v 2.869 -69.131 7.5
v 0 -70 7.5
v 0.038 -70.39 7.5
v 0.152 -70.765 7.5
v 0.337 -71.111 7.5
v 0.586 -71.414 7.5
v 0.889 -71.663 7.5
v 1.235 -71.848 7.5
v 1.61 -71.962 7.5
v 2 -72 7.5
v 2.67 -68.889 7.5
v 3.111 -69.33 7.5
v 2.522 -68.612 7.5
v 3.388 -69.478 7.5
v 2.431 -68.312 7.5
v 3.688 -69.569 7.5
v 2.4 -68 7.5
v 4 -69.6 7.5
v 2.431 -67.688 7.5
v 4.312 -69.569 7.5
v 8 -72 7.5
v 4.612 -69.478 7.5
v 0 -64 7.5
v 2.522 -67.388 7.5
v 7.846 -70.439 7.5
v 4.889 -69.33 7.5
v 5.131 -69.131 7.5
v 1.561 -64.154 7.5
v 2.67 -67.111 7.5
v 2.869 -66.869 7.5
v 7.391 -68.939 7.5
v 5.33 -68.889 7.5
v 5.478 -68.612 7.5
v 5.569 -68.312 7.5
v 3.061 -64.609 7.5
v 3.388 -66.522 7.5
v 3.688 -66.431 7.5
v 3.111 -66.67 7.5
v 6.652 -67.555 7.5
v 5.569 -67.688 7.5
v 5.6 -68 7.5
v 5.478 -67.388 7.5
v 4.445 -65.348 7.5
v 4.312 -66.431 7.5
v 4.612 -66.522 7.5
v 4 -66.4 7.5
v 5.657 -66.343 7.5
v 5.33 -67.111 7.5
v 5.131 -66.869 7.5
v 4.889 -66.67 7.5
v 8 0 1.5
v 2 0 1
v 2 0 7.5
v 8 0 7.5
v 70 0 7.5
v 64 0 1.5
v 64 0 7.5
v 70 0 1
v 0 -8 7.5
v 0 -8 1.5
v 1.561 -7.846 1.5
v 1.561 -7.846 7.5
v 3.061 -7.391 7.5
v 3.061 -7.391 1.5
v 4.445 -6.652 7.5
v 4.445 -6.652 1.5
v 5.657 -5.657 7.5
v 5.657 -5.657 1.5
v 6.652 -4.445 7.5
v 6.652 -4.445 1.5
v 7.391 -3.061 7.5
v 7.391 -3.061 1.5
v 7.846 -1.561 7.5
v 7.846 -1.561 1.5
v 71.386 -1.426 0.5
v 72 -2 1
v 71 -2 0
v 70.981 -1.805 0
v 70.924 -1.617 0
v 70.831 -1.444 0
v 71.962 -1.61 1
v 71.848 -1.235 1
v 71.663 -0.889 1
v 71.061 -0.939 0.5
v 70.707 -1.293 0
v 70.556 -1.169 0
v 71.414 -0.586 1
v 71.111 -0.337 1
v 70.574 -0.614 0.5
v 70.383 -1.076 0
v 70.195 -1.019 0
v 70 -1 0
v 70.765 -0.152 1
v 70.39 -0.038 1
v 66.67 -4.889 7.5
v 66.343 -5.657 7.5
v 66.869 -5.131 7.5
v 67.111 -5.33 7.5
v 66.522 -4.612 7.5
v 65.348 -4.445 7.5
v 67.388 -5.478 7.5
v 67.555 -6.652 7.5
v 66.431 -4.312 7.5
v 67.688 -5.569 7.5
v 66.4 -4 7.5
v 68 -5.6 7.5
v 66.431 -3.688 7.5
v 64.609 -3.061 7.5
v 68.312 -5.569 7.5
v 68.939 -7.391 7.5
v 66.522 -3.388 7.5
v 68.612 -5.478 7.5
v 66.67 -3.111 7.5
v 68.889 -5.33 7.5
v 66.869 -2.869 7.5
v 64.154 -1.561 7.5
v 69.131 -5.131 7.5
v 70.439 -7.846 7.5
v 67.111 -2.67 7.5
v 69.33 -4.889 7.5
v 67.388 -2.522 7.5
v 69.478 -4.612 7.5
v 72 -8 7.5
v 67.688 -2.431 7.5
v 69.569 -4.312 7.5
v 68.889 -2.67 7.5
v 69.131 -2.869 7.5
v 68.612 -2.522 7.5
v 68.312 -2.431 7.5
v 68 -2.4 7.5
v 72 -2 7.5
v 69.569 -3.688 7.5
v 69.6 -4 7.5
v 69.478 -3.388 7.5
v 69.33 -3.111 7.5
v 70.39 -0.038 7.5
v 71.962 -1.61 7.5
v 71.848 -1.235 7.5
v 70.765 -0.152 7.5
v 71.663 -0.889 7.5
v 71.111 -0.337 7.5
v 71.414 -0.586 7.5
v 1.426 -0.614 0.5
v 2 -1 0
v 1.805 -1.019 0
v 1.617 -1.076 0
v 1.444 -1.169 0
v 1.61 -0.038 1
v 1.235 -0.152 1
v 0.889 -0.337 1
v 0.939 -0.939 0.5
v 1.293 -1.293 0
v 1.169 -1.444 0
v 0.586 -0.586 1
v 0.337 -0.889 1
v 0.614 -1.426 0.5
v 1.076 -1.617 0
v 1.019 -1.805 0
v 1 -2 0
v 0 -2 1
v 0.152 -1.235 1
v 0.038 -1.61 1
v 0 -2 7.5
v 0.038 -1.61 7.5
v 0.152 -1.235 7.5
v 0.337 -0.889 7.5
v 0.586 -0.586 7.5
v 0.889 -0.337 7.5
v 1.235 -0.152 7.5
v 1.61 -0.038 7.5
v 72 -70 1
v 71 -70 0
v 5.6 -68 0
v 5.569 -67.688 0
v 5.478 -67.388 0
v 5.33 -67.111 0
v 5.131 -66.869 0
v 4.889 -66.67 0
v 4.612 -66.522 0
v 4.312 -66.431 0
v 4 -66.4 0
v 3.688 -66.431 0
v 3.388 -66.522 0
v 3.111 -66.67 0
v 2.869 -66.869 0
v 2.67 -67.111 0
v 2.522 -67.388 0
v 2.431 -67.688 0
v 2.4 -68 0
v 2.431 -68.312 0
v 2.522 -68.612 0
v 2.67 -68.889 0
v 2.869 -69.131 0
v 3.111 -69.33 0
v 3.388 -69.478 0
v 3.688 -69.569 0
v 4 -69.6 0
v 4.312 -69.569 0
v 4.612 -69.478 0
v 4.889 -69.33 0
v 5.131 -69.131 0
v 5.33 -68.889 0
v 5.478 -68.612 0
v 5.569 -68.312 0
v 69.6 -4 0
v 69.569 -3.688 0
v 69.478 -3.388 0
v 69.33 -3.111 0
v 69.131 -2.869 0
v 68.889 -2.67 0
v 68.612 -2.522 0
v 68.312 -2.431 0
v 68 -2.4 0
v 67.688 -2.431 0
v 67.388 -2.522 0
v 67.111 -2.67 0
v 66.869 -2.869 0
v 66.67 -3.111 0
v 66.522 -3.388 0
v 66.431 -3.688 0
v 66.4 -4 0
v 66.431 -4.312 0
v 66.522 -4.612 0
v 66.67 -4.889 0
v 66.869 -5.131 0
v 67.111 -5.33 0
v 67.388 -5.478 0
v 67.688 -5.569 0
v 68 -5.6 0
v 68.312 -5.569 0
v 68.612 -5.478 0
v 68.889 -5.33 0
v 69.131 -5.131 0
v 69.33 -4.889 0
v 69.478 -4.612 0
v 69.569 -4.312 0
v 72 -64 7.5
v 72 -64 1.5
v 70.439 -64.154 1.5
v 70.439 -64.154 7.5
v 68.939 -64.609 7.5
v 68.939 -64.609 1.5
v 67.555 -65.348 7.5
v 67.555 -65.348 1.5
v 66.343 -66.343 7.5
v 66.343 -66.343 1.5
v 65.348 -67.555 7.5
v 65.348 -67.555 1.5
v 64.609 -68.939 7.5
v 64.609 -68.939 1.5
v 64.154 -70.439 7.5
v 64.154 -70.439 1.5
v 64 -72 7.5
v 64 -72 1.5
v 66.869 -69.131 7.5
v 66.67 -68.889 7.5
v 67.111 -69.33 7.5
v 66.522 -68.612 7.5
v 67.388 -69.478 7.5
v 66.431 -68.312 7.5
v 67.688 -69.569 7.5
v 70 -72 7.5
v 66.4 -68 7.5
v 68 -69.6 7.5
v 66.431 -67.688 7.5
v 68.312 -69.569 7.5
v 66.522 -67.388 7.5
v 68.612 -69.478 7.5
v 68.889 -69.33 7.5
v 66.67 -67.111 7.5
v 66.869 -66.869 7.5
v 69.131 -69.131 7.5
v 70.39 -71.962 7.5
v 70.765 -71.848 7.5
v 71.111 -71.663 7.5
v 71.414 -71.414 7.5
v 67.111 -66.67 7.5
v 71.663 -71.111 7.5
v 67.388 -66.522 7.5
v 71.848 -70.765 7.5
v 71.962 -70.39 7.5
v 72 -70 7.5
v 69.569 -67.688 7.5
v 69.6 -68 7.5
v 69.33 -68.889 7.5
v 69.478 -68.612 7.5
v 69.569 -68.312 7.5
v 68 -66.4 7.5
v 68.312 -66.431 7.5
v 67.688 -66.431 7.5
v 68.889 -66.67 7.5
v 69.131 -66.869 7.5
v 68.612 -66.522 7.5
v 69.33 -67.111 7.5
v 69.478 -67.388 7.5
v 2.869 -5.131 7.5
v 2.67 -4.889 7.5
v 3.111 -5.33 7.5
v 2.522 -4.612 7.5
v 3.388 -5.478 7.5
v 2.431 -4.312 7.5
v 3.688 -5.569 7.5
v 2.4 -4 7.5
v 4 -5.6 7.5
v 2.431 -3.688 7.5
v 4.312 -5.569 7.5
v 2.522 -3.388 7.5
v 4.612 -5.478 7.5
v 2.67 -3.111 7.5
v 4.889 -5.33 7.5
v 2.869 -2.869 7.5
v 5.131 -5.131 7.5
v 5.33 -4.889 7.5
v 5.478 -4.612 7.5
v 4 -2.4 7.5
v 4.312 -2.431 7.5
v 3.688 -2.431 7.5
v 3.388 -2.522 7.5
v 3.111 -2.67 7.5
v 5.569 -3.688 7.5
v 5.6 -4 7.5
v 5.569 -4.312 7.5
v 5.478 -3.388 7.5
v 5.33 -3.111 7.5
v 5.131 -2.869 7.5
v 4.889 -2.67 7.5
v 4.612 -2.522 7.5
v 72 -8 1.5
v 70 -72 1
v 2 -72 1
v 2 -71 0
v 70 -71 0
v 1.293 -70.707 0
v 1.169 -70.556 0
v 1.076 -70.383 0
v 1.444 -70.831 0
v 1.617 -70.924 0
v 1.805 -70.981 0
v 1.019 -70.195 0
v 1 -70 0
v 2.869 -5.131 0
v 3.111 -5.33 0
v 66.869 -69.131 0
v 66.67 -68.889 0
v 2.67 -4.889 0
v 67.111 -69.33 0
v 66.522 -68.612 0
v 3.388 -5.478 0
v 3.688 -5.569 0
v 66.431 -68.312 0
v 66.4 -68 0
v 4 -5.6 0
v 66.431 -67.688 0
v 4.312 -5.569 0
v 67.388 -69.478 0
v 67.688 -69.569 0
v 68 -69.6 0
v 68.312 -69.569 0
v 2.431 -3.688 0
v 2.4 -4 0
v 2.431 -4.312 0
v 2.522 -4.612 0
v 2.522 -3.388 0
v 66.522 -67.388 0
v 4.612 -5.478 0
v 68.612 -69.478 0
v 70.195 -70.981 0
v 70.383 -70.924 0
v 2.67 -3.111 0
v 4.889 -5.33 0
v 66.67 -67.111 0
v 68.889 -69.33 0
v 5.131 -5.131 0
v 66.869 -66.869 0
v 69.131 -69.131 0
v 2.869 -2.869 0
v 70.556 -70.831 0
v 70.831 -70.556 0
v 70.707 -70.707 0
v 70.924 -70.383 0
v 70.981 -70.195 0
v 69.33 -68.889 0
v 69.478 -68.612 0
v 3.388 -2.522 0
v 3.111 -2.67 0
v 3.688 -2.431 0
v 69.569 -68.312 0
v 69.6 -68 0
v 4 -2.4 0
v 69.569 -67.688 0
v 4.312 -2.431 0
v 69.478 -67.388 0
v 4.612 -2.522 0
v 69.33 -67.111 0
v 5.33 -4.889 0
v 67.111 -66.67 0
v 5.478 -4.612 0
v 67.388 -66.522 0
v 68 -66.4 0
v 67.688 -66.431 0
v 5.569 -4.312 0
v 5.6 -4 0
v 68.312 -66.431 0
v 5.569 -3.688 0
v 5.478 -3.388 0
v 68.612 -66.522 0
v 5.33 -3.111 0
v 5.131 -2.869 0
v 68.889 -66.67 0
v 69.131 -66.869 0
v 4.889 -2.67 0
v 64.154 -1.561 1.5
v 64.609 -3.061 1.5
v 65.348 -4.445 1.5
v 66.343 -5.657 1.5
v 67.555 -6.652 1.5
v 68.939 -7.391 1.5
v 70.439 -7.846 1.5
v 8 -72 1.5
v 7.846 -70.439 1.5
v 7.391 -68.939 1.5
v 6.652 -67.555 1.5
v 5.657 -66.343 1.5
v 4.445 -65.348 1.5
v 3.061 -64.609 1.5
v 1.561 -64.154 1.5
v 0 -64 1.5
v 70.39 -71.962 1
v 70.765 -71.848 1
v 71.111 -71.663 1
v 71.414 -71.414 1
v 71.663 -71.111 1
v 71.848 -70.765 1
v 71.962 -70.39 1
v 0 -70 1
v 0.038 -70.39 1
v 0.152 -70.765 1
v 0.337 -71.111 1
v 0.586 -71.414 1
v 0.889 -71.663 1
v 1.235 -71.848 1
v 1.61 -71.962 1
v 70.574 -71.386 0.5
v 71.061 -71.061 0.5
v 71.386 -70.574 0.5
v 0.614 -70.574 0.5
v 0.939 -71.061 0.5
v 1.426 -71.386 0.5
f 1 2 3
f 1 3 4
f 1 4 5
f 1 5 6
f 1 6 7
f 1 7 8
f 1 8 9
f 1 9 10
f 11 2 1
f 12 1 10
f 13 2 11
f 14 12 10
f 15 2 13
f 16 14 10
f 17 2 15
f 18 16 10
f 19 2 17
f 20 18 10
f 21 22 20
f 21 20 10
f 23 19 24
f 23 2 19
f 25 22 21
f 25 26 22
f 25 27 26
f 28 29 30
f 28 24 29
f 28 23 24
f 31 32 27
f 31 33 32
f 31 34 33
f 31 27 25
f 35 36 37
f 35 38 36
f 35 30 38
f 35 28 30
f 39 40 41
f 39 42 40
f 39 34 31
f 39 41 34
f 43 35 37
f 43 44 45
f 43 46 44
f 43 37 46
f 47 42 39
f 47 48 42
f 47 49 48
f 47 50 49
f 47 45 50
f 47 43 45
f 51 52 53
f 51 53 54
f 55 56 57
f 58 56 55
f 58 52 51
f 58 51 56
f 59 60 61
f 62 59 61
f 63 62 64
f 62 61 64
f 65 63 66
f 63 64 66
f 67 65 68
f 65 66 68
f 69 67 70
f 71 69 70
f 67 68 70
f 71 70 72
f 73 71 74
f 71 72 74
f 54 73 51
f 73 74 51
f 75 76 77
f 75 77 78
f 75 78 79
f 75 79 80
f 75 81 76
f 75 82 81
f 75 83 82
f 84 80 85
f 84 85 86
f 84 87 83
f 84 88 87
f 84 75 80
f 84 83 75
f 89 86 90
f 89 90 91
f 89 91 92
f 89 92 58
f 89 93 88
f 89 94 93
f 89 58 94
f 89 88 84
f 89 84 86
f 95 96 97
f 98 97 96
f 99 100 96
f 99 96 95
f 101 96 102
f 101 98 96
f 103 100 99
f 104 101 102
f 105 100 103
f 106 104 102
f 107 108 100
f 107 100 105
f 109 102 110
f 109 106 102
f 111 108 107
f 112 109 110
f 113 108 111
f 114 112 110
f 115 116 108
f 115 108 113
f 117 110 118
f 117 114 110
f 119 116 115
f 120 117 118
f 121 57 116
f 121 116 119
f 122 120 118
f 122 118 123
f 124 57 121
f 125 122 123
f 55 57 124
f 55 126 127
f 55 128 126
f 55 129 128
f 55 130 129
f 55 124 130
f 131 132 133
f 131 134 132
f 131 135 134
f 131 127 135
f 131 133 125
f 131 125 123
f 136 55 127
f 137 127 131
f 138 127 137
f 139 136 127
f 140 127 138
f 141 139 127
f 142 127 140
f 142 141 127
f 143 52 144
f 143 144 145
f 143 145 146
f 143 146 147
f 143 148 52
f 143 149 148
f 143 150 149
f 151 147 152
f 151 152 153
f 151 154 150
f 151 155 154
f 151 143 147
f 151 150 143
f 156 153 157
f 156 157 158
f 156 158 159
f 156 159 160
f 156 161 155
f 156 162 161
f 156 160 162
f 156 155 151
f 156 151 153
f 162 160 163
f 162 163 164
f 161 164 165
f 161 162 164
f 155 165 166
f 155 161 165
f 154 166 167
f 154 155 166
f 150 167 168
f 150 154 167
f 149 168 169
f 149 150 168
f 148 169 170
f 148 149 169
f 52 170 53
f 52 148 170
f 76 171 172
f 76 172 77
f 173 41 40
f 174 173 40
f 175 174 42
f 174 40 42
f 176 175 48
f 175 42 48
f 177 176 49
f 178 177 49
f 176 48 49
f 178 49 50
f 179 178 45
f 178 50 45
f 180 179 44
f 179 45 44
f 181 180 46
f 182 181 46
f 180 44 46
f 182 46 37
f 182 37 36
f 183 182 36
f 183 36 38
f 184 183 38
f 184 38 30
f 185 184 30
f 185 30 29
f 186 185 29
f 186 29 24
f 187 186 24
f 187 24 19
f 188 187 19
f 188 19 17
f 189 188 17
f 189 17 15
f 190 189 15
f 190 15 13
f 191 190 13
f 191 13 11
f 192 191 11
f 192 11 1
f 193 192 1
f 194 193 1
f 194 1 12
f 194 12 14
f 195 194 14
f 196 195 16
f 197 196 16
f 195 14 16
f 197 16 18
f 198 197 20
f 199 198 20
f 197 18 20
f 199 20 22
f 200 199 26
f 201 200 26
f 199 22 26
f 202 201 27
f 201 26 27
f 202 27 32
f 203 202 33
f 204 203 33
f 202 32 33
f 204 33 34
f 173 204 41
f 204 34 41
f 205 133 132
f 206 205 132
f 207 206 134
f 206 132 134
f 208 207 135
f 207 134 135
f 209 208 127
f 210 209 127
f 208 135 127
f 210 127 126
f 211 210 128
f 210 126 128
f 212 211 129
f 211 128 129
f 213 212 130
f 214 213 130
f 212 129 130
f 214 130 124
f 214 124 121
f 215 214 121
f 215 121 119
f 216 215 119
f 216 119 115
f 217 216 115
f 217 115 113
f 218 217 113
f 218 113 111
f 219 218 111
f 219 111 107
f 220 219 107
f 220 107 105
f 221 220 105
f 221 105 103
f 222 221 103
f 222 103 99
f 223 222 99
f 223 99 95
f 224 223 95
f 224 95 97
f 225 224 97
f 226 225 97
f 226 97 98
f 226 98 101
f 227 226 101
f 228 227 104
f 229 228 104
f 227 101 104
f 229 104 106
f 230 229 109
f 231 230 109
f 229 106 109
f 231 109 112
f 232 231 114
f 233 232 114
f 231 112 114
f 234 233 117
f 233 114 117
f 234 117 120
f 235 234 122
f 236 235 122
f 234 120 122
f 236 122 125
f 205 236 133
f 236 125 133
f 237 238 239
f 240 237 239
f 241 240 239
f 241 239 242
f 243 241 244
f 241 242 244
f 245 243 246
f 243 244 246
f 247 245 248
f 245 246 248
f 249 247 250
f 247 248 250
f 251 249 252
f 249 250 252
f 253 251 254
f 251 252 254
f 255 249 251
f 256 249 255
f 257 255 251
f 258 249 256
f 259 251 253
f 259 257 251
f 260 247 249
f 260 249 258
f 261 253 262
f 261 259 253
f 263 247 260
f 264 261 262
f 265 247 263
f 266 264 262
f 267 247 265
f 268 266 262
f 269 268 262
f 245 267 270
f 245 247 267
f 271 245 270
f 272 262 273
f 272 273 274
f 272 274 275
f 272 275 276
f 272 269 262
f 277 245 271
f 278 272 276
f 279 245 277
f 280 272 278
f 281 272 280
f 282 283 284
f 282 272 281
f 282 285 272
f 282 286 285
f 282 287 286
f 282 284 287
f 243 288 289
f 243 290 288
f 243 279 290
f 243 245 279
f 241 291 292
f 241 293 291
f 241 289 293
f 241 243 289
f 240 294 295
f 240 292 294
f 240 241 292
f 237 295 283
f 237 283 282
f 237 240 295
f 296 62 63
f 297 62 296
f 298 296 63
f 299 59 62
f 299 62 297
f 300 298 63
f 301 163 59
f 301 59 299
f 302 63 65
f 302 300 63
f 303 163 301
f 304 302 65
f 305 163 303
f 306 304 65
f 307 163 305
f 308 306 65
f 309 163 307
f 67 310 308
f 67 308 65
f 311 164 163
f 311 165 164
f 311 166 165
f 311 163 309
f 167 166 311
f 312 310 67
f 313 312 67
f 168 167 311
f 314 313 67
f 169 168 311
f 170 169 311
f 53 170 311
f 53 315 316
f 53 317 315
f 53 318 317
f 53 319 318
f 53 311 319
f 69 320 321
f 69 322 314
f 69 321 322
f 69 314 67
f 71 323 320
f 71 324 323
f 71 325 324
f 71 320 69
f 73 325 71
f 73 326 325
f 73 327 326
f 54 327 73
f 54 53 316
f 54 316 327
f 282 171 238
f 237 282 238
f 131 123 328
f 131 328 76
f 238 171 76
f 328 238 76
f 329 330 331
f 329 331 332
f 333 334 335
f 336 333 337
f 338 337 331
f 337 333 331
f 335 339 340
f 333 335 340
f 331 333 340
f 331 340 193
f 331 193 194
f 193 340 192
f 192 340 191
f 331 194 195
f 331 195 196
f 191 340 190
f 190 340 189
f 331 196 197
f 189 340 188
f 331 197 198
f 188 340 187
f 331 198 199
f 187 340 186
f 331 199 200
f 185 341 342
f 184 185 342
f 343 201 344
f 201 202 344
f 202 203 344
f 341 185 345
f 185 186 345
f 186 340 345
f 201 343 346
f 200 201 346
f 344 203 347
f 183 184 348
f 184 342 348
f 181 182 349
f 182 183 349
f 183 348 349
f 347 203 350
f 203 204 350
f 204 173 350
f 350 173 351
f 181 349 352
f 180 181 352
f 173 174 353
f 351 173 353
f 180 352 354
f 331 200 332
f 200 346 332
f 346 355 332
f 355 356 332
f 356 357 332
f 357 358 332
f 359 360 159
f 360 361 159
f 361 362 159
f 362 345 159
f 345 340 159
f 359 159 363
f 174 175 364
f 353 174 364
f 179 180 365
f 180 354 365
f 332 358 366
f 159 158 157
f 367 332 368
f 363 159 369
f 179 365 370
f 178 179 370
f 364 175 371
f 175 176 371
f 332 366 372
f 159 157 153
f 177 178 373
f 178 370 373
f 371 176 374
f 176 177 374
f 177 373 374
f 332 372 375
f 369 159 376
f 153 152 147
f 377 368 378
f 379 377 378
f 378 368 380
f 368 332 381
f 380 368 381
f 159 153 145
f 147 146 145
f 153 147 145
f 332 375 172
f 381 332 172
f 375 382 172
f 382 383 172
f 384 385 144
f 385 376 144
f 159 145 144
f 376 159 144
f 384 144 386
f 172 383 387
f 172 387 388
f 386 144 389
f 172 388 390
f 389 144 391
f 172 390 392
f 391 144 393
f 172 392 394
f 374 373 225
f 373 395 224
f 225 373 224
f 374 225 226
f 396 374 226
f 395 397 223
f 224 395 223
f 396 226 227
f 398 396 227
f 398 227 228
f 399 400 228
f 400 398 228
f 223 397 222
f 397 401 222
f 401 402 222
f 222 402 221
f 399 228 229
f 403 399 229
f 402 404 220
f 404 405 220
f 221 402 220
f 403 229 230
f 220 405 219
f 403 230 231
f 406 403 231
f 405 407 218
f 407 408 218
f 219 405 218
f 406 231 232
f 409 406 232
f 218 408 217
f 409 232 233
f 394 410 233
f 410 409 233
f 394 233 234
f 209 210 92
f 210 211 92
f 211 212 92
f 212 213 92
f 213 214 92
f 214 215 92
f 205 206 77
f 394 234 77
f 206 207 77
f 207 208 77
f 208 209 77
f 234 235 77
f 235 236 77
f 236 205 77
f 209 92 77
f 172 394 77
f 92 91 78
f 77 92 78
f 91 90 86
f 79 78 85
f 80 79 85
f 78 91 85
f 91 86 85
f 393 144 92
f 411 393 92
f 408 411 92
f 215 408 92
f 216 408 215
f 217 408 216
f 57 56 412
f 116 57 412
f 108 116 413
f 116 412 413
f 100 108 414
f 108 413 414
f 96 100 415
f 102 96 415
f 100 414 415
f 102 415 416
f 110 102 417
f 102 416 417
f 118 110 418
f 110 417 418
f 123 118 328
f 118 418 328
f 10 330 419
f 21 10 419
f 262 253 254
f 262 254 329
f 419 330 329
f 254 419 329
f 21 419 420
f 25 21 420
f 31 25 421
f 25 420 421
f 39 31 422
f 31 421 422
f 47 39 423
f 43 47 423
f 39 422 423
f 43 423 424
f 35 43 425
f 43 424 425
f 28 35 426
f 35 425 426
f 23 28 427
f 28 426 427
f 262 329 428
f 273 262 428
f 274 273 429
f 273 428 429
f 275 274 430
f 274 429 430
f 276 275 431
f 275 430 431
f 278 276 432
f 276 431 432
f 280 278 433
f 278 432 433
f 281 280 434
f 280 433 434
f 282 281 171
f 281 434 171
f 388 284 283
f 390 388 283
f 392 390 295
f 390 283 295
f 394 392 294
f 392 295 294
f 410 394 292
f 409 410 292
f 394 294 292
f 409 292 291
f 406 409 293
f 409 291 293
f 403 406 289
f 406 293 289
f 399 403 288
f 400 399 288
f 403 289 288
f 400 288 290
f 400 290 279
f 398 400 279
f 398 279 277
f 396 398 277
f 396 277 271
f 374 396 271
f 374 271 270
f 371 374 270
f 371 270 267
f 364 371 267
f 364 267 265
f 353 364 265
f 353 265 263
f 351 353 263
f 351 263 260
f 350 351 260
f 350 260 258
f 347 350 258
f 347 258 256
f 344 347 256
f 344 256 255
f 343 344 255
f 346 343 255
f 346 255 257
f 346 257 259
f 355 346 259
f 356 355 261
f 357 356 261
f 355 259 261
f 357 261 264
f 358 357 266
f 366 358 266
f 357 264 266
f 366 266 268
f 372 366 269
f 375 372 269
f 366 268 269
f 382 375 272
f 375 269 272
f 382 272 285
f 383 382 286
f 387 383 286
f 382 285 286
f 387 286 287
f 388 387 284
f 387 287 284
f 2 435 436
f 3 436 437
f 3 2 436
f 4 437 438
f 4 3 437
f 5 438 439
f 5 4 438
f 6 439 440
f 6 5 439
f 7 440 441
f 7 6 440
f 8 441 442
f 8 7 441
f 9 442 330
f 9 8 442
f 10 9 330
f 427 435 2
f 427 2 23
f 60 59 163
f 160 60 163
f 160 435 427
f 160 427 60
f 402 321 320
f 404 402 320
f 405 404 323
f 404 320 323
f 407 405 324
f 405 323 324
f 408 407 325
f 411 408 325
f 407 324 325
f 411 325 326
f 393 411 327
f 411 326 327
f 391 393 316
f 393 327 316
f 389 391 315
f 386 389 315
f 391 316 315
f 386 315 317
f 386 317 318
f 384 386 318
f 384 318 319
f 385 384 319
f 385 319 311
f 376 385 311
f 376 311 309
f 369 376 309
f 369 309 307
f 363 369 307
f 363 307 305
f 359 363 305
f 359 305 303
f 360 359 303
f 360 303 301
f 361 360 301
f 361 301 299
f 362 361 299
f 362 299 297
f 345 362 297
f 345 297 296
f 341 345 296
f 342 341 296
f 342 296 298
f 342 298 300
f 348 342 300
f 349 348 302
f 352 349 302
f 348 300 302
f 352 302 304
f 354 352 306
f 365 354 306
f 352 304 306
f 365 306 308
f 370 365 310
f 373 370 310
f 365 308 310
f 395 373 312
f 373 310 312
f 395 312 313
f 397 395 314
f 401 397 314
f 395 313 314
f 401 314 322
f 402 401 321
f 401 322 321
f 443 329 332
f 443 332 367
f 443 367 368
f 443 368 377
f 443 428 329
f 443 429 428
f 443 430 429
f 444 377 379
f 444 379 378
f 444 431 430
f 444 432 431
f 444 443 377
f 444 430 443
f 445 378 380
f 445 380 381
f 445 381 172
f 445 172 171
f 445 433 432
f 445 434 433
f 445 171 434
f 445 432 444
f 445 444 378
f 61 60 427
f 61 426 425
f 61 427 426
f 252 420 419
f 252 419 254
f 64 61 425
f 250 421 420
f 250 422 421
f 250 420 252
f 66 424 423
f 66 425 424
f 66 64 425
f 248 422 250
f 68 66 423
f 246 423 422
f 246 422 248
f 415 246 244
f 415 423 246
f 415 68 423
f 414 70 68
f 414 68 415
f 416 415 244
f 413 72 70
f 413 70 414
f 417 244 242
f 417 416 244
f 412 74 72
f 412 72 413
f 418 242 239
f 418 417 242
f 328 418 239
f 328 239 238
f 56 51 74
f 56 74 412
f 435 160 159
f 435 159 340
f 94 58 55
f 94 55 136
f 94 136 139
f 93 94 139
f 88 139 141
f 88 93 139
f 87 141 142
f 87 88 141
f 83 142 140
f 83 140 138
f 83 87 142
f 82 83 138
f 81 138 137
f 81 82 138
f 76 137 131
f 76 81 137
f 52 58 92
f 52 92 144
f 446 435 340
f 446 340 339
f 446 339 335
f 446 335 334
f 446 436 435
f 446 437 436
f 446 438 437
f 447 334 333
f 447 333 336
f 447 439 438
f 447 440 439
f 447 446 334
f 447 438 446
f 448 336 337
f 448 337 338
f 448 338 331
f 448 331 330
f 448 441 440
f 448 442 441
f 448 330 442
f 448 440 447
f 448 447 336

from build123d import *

# Parameters (mm, degrees)
SKETCH_W     = 72
SKETCH_H     = 72
PAD_DEPTH    = 1.5
PAD001_DEPTH = 6
SKETCH002_R  = 1.6
POCKET_DEPTH = 7.501
FILLET_R     = 2
CHAMFER_SIZE = 1


with BuildPart() as part:
    # Sketch → Pad (new body)
    with BuildSketch(Plane.XY):
        with Locations((36, -36)):
            Rectangle(SKETCH_W, SKETCH_H)
    extrude(amount=PAD_DEPTH)

    # Sketch001 (on Face6 of Pad) → Pad001 (join)
    with BuildSketch(Plane.XY.offset(1.5)):
        with BuildLine():
            ThreePointArc((0, -8), (5.656854, -5.656854), (8, 0))
            Line((0, 0), (8, 0))
            Line((0, -8), (0, 0))
        make_face()
        with BuildLine():
            ThreePointArc((8, -72), (5.656854, -66.343146), (0, -64))
            Line((0, -72), (0, -64))
            Line((8, -72), (0, -72))
        make_face()
        with BuildLine():
            ThreePointArc((72, -64), (66.343146, -66.343146), (64, -72))
            Line((64, -72), (72, -72))
            Line((72, -72), (72, -64))
        make_face()
        with BuildLine():
            ThreePointArc((64, 0), (66.343146, -5.656854), (72, -8))
            Line((72, -8), (72, 0))
            Line((72, 0), (64, 0))
        make_face()
    extrude(amount=PAD001_DEPTH)

    # Sketch002 (on Face14 of Pad001) → Pocket (cut, through all)
    with BuildSketch(Plane.XY.offset(7.5)):
        with Locations((4, -4)):
            Circle(SKETCH002_R)
        with Locations((68, -4)):
            Circle(SKETCH002_R)
        with Locations((68, -68)):
            Circle(SKETCH002_R)
        with Locations((4, -68)):
            Circle(SKETCH002_R)
    extrude(amount=-POCKET_DEPTH, mode=Mode.SUBTRACT)

    # Fillet
    fillet_edges = [part.edges().sort_by_distance(p)[0] for p in [
        (0, 0, 4.5),
        (72, 0, 4.5),
        (0, -72, 4.5),
        (72, -72, 4.5),
    ]]
    fillet(fillet_edges, radius=FILLET_R)

    # Chamfer
    chamfer_edges = [part.edges().sort_by_distance(p)[0] for p in [
        (36, -72, 0),
    ]]
    chamfer(chamfer_edges, length=CHAMFER_SIZE)


solid = part.part
